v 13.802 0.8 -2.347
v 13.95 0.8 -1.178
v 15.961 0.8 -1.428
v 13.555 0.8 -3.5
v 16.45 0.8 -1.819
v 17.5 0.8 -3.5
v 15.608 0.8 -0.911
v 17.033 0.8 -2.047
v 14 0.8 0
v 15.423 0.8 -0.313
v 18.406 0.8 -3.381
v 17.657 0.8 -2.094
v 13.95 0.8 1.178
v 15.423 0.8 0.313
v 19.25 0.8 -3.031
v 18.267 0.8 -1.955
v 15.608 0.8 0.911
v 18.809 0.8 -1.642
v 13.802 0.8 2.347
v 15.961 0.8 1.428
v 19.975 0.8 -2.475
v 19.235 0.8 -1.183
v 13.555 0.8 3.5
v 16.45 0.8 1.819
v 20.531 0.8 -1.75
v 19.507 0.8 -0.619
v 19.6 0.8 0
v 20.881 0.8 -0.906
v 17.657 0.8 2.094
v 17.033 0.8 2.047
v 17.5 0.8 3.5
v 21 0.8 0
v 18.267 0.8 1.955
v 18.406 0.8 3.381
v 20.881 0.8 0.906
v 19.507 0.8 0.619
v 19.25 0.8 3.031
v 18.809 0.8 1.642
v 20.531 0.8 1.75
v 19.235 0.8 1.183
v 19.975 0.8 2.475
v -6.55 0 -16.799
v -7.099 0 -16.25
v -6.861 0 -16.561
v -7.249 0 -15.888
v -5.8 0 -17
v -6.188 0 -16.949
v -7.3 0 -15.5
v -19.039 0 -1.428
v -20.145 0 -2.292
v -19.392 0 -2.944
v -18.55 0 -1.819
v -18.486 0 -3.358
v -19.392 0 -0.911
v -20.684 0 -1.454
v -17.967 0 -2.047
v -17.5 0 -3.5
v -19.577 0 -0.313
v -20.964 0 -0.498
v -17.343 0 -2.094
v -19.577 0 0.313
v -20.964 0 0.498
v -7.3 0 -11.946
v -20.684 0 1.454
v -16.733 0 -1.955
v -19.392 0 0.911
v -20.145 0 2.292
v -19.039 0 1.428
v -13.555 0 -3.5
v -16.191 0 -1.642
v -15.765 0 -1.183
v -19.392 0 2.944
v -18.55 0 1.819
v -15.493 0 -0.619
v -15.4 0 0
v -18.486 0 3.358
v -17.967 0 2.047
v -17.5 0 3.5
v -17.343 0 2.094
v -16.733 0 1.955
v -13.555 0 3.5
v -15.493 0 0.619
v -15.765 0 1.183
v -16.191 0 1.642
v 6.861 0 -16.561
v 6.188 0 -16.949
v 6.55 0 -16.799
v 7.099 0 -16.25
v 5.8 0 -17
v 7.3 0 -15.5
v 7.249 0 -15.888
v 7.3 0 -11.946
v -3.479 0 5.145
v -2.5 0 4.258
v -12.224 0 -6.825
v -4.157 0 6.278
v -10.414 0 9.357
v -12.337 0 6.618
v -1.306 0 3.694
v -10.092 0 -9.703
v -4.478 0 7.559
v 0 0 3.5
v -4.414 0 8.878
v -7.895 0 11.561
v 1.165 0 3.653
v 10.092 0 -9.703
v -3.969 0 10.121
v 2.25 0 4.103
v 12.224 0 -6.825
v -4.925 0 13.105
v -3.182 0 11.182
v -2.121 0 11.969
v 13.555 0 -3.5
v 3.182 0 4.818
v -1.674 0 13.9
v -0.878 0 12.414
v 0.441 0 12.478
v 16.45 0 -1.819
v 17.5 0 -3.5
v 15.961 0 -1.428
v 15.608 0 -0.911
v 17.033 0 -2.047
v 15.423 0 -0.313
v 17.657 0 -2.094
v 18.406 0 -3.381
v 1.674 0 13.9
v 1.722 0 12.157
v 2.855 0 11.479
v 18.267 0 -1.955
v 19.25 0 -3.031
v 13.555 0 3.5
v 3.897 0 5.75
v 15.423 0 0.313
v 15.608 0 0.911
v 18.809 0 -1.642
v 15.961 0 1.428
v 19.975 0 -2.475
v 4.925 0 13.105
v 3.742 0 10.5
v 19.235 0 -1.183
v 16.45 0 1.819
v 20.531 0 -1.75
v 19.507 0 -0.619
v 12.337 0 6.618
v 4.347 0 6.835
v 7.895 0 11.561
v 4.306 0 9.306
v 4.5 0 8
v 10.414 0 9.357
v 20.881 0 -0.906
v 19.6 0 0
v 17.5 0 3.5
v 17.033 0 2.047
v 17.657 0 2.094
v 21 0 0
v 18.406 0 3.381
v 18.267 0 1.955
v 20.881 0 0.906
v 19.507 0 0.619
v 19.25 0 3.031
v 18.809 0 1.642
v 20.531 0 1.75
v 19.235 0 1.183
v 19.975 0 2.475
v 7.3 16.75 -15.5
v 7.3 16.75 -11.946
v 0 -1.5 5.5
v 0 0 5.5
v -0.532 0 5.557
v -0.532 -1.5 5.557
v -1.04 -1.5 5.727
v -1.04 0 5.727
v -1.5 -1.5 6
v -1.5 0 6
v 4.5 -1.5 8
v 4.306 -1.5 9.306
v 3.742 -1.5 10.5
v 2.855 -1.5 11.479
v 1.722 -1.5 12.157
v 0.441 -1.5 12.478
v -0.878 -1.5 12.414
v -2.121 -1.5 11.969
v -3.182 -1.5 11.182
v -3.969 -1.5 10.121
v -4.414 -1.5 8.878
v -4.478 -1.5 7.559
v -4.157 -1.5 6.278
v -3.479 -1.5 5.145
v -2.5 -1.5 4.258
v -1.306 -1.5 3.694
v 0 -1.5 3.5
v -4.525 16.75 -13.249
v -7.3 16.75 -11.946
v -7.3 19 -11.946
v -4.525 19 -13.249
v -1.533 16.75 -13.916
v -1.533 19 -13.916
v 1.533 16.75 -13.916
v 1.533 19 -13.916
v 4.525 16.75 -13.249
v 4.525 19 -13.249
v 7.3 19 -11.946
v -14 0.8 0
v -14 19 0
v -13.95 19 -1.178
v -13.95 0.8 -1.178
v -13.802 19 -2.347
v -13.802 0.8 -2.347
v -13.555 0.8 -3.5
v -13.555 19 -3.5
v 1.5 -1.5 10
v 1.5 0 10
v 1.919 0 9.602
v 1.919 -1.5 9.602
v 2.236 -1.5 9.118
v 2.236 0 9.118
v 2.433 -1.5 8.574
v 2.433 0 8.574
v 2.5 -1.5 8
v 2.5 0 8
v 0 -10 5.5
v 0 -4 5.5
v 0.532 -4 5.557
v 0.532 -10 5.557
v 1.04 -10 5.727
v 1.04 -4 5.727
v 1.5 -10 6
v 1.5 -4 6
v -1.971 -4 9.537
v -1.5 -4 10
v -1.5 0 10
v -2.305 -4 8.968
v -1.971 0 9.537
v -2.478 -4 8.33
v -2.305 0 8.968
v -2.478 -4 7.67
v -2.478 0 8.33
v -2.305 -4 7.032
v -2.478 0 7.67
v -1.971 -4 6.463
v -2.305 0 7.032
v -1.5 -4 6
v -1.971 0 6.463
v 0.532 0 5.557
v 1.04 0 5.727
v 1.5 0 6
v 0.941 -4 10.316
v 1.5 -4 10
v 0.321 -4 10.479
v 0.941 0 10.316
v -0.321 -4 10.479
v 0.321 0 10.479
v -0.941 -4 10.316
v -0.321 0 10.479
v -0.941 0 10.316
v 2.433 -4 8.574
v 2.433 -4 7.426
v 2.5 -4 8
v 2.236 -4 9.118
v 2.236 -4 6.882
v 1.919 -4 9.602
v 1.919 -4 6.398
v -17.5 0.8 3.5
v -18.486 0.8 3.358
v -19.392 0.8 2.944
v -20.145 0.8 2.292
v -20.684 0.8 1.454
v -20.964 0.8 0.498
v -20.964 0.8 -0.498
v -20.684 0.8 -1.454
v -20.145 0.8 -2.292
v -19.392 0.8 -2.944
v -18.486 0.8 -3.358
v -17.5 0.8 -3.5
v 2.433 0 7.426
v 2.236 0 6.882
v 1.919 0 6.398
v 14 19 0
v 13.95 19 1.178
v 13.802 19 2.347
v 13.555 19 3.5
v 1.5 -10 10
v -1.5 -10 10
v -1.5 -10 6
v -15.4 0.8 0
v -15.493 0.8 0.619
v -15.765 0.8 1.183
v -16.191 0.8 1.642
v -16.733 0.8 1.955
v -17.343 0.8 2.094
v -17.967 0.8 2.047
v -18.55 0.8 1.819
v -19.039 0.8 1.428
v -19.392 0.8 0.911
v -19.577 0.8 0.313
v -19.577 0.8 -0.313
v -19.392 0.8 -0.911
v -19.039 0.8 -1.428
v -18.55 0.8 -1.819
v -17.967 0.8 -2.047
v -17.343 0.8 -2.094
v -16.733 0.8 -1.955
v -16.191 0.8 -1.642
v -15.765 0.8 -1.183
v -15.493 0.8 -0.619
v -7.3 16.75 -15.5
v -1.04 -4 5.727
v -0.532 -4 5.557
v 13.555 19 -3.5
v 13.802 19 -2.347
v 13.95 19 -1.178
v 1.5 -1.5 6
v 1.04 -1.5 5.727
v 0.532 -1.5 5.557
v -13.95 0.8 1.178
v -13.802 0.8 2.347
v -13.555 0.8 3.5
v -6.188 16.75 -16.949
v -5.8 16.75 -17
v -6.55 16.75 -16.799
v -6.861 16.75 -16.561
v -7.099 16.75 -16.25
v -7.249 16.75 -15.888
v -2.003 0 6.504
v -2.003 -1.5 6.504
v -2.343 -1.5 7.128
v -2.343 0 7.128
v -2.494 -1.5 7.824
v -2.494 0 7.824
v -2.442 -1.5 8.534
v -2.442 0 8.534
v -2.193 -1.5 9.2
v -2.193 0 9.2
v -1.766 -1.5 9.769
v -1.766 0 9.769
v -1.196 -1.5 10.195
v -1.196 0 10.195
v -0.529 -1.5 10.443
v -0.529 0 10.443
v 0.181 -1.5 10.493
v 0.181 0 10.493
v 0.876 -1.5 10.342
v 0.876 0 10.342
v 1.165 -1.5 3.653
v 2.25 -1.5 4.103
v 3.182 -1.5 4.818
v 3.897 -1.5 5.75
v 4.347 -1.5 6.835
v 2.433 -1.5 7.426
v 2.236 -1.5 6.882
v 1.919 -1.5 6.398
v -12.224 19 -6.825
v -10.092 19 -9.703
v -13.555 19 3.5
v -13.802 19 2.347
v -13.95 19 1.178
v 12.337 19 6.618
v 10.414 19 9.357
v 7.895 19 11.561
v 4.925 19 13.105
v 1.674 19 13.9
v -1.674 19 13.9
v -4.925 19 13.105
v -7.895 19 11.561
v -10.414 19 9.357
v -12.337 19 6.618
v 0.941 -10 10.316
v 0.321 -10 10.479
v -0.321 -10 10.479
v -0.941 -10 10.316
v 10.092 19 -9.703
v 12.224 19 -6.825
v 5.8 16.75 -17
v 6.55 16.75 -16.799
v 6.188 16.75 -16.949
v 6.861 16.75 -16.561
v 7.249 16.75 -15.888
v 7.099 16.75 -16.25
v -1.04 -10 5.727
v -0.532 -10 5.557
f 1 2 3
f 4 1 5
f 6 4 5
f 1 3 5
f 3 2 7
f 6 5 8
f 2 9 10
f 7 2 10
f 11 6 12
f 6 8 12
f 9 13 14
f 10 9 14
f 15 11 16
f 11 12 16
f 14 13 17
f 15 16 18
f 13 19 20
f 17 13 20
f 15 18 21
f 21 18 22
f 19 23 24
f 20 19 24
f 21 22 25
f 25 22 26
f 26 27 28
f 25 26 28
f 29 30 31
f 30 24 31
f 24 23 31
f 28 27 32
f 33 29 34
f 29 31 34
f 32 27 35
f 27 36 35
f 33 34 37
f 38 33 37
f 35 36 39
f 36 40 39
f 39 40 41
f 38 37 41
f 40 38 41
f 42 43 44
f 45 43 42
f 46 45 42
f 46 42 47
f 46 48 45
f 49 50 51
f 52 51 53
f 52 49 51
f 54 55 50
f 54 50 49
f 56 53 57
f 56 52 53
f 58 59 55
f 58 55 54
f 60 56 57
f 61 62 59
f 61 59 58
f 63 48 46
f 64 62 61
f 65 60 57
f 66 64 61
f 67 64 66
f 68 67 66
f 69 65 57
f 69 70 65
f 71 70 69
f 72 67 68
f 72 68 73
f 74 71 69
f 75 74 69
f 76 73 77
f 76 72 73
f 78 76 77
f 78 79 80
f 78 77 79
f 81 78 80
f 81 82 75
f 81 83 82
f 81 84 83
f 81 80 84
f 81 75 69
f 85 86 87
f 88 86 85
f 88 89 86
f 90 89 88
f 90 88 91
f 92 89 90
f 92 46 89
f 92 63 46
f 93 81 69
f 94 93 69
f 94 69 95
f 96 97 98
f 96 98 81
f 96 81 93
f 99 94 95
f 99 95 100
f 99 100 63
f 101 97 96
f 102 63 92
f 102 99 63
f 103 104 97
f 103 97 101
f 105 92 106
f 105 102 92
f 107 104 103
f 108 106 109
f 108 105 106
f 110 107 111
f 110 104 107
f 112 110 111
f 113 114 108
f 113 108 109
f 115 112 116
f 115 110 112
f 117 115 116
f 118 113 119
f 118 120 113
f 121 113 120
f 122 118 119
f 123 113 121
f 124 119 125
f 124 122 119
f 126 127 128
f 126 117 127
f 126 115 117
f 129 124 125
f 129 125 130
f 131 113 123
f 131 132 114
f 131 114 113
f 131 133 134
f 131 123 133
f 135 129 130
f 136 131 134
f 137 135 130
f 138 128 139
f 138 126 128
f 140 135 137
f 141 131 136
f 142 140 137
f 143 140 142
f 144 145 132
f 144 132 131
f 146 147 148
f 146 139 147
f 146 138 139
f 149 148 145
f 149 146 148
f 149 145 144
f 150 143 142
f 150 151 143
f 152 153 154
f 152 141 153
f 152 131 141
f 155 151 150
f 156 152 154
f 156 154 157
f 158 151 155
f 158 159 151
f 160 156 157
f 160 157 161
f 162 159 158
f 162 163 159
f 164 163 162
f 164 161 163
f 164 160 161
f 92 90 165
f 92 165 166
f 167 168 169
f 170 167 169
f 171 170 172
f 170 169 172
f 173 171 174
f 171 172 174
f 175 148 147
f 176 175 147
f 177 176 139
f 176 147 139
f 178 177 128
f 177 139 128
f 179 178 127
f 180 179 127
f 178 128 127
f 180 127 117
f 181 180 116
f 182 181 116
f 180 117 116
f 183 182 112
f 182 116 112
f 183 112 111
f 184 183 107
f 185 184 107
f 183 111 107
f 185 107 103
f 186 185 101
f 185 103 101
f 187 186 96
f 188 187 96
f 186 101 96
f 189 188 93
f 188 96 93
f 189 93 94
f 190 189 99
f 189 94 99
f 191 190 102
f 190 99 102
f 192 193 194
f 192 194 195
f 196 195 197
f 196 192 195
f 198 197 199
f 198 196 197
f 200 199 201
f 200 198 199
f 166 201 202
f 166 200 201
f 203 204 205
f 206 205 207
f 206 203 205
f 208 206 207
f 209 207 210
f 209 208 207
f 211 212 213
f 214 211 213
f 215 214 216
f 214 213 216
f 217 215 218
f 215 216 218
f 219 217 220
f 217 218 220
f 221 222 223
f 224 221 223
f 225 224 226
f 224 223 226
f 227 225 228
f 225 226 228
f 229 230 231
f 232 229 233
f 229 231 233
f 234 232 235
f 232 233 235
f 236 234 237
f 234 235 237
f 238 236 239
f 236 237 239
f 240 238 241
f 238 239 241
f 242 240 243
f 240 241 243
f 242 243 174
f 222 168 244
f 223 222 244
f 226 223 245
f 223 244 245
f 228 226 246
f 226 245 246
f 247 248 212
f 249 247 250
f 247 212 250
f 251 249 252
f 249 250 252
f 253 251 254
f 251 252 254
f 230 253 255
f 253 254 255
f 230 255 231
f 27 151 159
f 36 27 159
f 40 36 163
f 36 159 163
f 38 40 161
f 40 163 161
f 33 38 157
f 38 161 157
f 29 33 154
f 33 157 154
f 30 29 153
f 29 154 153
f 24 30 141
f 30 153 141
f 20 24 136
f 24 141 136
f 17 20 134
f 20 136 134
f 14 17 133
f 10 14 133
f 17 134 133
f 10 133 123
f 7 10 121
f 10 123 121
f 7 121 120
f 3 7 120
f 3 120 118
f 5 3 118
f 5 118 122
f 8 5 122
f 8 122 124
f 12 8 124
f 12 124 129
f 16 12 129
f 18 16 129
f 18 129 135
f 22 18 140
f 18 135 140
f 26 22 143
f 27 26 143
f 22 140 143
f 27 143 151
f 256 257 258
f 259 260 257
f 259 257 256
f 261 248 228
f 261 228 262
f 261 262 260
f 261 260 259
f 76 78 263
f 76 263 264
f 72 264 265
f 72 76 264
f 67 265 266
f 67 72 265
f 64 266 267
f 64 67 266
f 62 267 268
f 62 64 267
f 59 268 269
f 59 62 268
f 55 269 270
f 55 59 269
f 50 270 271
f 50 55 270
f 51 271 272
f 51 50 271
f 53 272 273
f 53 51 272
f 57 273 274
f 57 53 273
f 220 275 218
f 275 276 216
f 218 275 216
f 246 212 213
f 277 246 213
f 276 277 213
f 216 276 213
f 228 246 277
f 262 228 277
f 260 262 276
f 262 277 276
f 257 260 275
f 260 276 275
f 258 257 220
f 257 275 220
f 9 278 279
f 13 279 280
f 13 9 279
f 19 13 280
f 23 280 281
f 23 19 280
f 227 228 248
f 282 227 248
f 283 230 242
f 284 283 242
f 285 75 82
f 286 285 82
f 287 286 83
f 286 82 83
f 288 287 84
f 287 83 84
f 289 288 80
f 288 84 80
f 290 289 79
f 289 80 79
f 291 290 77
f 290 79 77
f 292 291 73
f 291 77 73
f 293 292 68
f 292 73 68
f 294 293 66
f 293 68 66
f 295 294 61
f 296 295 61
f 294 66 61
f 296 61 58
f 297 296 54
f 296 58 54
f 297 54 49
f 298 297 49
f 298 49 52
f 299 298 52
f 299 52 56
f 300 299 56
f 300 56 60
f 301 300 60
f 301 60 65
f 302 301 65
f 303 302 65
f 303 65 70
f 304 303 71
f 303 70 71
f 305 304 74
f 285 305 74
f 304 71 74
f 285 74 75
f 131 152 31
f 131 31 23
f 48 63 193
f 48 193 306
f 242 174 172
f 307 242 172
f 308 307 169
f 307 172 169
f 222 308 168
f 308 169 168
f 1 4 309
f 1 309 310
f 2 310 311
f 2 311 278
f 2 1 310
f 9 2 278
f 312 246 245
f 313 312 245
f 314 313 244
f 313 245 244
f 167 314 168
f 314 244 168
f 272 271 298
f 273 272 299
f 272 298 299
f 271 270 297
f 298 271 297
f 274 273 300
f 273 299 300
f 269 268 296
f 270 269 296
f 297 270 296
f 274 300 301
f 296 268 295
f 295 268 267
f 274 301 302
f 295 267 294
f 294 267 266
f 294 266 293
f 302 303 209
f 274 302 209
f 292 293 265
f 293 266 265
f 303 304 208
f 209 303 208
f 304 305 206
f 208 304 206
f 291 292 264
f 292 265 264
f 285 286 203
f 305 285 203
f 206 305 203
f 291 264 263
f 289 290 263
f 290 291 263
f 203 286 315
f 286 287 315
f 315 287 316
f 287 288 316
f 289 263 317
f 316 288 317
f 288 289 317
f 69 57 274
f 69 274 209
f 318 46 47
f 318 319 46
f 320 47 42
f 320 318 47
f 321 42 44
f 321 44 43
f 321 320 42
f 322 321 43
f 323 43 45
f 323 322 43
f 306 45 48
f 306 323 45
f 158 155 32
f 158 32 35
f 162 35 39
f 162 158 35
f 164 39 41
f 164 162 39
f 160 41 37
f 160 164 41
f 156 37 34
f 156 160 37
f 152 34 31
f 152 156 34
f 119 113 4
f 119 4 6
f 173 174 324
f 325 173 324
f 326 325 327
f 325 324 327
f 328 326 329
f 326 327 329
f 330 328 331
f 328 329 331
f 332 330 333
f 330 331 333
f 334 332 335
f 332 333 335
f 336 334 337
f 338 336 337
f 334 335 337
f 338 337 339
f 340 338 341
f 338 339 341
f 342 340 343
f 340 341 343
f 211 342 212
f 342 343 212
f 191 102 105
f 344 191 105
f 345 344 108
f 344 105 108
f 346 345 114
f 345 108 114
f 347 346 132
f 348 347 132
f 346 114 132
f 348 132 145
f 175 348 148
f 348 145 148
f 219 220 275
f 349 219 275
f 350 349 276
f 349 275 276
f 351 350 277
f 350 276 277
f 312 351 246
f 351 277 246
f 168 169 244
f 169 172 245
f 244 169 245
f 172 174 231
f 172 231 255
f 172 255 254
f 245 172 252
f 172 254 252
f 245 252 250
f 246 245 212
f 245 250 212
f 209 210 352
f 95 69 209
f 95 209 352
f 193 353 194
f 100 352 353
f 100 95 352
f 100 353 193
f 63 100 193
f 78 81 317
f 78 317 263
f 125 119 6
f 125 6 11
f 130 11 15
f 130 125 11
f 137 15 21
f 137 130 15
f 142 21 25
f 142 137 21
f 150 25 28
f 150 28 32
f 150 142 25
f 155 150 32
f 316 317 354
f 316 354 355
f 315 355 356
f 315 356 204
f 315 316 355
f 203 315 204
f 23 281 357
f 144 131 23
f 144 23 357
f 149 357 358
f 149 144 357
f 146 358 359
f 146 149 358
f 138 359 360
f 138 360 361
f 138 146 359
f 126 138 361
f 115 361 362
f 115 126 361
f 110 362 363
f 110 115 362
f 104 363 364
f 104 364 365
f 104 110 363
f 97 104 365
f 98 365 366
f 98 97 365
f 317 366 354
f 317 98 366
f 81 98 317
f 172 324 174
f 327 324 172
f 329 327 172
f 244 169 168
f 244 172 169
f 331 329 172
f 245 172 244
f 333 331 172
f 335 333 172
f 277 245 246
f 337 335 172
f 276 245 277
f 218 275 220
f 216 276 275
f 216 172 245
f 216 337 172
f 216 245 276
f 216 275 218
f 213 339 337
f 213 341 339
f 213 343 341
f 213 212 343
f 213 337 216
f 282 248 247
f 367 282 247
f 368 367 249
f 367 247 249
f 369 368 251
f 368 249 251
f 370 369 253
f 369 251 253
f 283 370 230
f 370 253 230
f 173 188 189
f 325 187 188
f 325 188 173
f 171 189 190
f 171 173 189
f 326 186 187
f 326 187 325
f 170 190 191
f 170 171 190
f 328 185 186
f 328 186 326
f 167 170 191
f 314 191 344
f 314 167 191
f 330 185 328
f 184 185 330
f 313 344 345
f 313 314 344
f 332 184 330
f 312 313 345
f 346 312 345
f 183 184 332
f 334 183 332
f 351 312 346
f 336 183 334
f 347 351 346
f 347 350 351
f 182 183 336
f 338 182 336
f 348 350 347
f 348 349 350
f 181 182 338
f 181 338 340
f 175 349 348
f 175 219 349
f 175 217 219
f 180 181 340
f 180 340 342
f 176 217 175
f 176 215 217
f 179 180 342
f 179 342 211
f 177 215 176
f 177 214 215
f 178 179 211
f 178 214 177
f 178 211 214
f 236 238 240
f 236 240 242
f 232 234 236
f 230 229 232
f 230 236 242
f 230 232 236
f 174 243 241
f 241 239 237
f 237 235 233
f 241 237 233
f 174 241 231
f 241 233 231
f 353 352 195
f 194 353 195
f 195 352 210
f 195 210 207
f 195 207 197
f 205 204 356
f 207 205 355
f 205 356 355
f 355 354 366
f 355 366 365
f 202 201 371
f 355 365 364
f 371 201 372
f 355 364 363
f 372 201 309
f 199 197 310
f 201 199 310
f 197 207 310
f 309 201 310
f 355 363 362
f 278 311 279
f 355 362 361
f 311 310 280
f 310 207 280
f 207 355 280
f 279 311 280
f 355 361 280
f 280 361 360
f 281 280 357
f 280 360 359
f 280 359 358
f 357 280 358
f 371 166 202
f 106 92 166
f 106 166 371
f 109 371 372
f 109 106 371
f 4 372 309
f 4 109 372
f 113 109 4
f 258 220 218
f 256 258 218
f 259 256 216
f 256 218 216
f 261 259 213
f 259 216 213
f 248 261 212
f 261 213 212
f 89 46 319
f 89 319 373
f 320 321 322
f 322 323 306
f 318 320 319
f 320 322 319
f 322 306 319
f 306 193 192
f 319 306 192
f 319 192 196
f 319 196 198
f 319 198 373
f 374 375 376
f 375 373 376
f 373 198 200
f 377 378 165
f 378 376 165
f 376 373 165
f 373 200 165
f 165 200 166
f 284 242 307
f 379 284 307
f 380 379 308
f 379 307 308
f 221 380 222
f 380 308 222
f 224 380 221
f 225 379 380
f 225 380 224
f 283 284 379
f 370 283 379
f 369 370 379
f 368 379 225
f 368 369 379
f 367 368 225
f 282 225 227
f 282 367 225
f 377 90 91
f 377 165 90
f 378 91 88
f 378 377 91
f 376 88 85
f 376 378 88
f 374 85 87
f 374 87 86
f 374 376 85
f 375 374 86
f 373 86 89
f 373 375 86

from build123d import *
from build123d import SkipClean  # not in build123d's __all__

# Parameters (mm, degrees)
F1_DEPTH = 1.5
F2_DEPTH = 19
F0_R     = 2.1
F3_DEPTH = 0.8
F4_DEPTH = 4
F5_DEPTH = 10
F6_DEPTH = 16.75
F7_R     = 1.5


with BuildPart() as f1:
    # F0 (on Front) → F1 (new body)
    with BuildSketch(Plane.XZ):
        with BuildLine():
            ThreePointArc((4.5, 8), (-3.1819805153, 11.1819805153), (0, 3.5))
            ThreePointArc((0, 3.5), (3.1819805153, 4.8180194847), (4.5, 8))
        make_face()
        with BuildLine():
            ThreePointArc((1.5, 6), (0.790569415, 5.6282917549), (0, 5.5))
            ThreePointArc((0, 5.5), (-0.790569415, 5.6282917549), (-1.5, 6))
            ThreePointArc((-1.5, 6), (-2.5, 8), (-1.5, 10))
            ThreePointArc((-1.5, 10), (0, 10.5), (1.5, 10))
            ThreePointArc((1.5, 10), (2.2360679775, 9.1180339887), (2.5, 8))
            ThreePointArc((2.5, 8), (2.2360679775, 6.8819660113), (1.5, 6))
        make_face(mode=Mode.SUBTRACT)
    extrude(amount=F1_DEPTH)

    # F0 (on Front) → F2 (join)
    with BuildSketch(Plane.XZ):
        with BuildLine():
            Line((0, 3.5), (13.5554417117, 3.5))
            ThreePointArc((13.5554417117, 3.5), (0, 14), (-13.5554417117, 3.5))
            Line((-13.5554417117, 3.5), (0, 3.5))
        make_face()
        with BuildLine():
            ThreePointArc((4.5, 8), (3.1819805153, 4.8180194847), (0, 3.5))
            ThreePointArc((0, 3.5), (-3.1819805153, 11.1819805153), (4.5, 8))
        make_face(mode=Mode.SUBTRACT)
        with BuildLine():
            ThreePointArc((-13.5554417117, -3.5), (-11.250406053, -8.3323684294), (-7.3, -11.9461290802))
            Line((-7.3, -11.9461290802), (-7.3, -3.5))
            Line((-7.3, -3.5), (-13.5554417117, -3.5))
        make_face()
        with BuildLine():
            ThreePointArc((4.5, 8), (-3.1819805153, 11.1819805153), (0, 3.5))
            ThreePointArc((0, 3.5), (3.1819805153, 4.8180194847), (4.5, 8))
        make_face()
        with BuildLine():
            ThreePointArc((1.5, 6), (0.790569415, 5.6282917549), (0, 5.5))
            ThreePointArc((0, 5.5), (-0.790569415, 5.6282917549), (-1.5, 6))
            ThreePointArc((-1.5, 6), (-2.5, 8), (-1.5, 10))
            ThreePointArc((-1.5, 10), (0, 10.5), (1.5, 10))
            ThreePointArc((1.5, 10), (2.2360679775, 9.1180339887), (2.5, 8))
            ThreePointArc((2.5, 8), (2.2360679775, 6.8819660113), (1.5, 6))
        make_face(mode=Mode.SUBTRACT)
        with BuildLine():
            ThreePointArc((-1.5, 10), (-2.5, 8), (-1.5, 6))
            Line((-1.5, 6), (-1.5, 10))
        make_face()
        with BuildLine():
            Line((1.5, 10), (1.5, 6))
            ThreePointArc((1.5, 6), (2.2360679775, 6.8819660113), (2.5, 8))
            ThreePointArc((2.5, 8), (2.2360679775, 9.1180339887), (1.5, 10))
        make_face()
        with BuildLine():
            ThreePointArc((-1.5, 6), (-0.790569415, 5.6282917549), (0, 5.5))
            ThreePointArc((0, 5.5), (0.790569415, 5.6282917549), (1.5, 6))
            Line((1.5, 6), (1.5, 10))
            ThreePointArc((1.5, 10), (0, 10.5), (-1.5, 10))
            Line((-1.5, 10), (-1.5, 6))
        make_face()
        with BuildLine():
            ThreePointArc((13.5554417117, -3.5), (13.8884157477, -1.7640600948), (14, 0))
            ThreePointArc((14, 0), (13.8884157477, 1.7640600948), (13.5554417117, 3.5))
            Line((13.5554417117, 3.5), (0, 3.5))
            Line((0, 3.5), (-13.5554417117, 3.5))
            ThreePointArc((-13.5554417117, 3.5), (-13.8884157477, 1.7640600948), (-14, 0))
            ThreePointArc((-14, 0), (-13.8884157477, -1.7640600948), (-13.5554417117, -3.5))
            Line((-13.5554417117, -3.5), (-7.3, -3.5))
            Line((-7.3, -3.5), (7.3, -3.5))
            Line((7.3, -3.5), (13.5554417117, -3.5))
        make_face()
        with BuildLine():
            ThreePointArc((-7.3, -11.9461290802), (0, -14), (7.3, -11.9461290802))
            Line((7.3, -11.9461290802), (7.3, -3.5))
            Line((7.3, -3.5), (-7.3, -3.5))
            Line((-7.3, -3.5), (-7.3, -11.9461290802))
        make_face()
        with BuildLine():
            ThreePointArc((7.3, -11.9461290802), (11.250406053, -8.3323684294), (13.5554417117, -3.5))
            Line((13.5554417117, -3.5), (7.3, -3.5))
            Line((7.3, -3.5), (7.3, -11.9461290802))
        make_face()
    extrude(amount=-F2_DEPTH)

    # F0 (on Front) → F3 (join)
    with BuildSketch(Plane.XZ):
        with BuildLine():
            ThreePointArc((-17.5, -3.5), (-15.0251262658, -2.4748737342), (-14, 0))
            ThreePointArc((-14, 0), (-15.0251262658, 2.4748737342), (-17.5, 3.5))
            ThreePointArc((-17.5, 3.5), (-21, 0), (-17.5, -3.5))
        make_face()
        with Locations((-17.5, 0)):
            Circle(F0_R, mode=Mode.SUBTRACT)
        with BuildLine():
            ThreePointArc((-14, 0), (-13.8884157477, 1.7640600948), (-13.5554417117, 3.5))
            Line((-13.5554417117, 3.5), (-17.5, 3.5))
            ThreePointArc((-17.5, 3.5), (-15.0251262658, 2.4748737342), (-14, 0))
        make_face()
        with BuildLine():
            ThreePointArc((-13.5554417117, -3.5), (-13.8884157477, -1.7640600948), (-14, 0))
            ThreePointArc((-14, 0), (-15.0251262658, -2.4748737342), (-17.5, -3.5))
            Line((-17.5, -3.5), (-13.5554417117, -3.5))
        make_face()
        with BuildLine():
            ThreePointArc((13.5554417117, 3.5), (13.8884157477, 1.7640600948), (14, 0))
            ThreePointArc((14, 0), (15.0251262658, 2.4748737342), (17.5, 3.5))
            Line((17.5, 3.5), (13.5554417117, 3.5))
        make_face()
        with BuildLine():
            ThreePointArc((17.5, 3.5), (15.0251262658, 2.4748737342), (14, 0))
            ThreePointArc((14, 0), (15.0251262658, -2.4748737342), (17.5, -3.5))
            ThreePointArc((17.5, -3.5), (19.9748737342, -2.4748737342), (21, 0))
            ThreePointArc((21, 0), (19.9748737342, 2.4748737342), (17.5, 3.5))
        make_face()
        with Locations((17.5, 0)):
            Circle(F0_R, mode=Mode.SUBTRACT)
        with BuildLine():
            ThreePointArc((17.5, -3.5), (15.0251262658, -2.4748737342), (14, 0))
            ThreePointArc((14, 0), (13.8884157477, -1.7640600948), (13.5554417117, -3.5))
            Line((13.5554417117, -3.5), (17.5, -3.5))
        make_face()
    extrude(amount=-F3_DEPTH)

    # F0 (on Front) → F6 (join)
    with BuildSketch(Plane.XZ):
        with BuildLine():
            Line((7.3, -17), (7.3, -11.9461290802))
            ThreePointArc((7.3, -11.9461290802), (0, -14), (-7.3, -11.9461290802))
            Line((-7.3, -11.9461290802), (-7.3, -17))
            Line((-7.3, -17), (7.3, -17))
        make_face()
    extrude(amount=-F6_DEPTH)

    # F7
    f7_edges = [f1.edges().sort_by_distance(p)[0] for p in [
        (-7.3, 8.375, -17),
        (7.3, 8.375, -17),
    ]]
    fillet(f7_edges, radius=F7_R)


with BuildPart() as f4:
    # F0 (on Front) → F4 (new body)
    with BuildSketch(Plane.XZ):
        with BuildLine():
            ThreePointArc((-1.5, 10), (-2.5, 8), (-1.5, 6))
            Line((-1.5, 6), (-1.5, 10))
        make_face()
        with BuildLine():
            ThreePointArc((-1.5, 6), (-0.790569415, 5.6282917549), (0, 5.5))
            ThreePointArc((0, 5.5), (0.790569415, 5.6282917549), (1.5, 6))
            Line((1.5, 6), (1.5, 10))
            ThreePointArc((1.5, 10), (0, 10.5), (-1.5, 10))
            Line((-1.5, 10), (-1.5, 6))
        make_face()
        with BuildLine():
            Line((1.5, 10), (1.5, 6))
            ThreePointArc((1.5, 6), (2.2360679775, 6.8819660113), (2.5, 8))
            ThreePointArc((2.5, 8), (2.2360679775, 9.1180339887), (1.5, 10))
        make_face()
    extrude(amount=F4_DEPTH)

    # F0 (on Front) → F5 (join)
    with BuildSketch(Plane.XZ):
        with BuildLine():
            ThreePointArc((-1.5, 6), (-0.790569415, 5.6282917549), (0, 5.5))
            ThreePointArc((0, 5.5), (0.790569415, 5.6282917549), (1.5, 6))
            Line((1.5, 6), (1.5, 10))
            ThreePointArc((1.5, 10), (0, 10.5), (-1.5, 10))
            Line((-1.5, 10), (-1.5, 6))
        make_face()
    with SkipClean():  # cleaning this boolean's faces spoils the solid; the shape is the same uncleaned
        extrude(amount=F5_DEPTH)


solid = Compound([f1.part, f4.part])
